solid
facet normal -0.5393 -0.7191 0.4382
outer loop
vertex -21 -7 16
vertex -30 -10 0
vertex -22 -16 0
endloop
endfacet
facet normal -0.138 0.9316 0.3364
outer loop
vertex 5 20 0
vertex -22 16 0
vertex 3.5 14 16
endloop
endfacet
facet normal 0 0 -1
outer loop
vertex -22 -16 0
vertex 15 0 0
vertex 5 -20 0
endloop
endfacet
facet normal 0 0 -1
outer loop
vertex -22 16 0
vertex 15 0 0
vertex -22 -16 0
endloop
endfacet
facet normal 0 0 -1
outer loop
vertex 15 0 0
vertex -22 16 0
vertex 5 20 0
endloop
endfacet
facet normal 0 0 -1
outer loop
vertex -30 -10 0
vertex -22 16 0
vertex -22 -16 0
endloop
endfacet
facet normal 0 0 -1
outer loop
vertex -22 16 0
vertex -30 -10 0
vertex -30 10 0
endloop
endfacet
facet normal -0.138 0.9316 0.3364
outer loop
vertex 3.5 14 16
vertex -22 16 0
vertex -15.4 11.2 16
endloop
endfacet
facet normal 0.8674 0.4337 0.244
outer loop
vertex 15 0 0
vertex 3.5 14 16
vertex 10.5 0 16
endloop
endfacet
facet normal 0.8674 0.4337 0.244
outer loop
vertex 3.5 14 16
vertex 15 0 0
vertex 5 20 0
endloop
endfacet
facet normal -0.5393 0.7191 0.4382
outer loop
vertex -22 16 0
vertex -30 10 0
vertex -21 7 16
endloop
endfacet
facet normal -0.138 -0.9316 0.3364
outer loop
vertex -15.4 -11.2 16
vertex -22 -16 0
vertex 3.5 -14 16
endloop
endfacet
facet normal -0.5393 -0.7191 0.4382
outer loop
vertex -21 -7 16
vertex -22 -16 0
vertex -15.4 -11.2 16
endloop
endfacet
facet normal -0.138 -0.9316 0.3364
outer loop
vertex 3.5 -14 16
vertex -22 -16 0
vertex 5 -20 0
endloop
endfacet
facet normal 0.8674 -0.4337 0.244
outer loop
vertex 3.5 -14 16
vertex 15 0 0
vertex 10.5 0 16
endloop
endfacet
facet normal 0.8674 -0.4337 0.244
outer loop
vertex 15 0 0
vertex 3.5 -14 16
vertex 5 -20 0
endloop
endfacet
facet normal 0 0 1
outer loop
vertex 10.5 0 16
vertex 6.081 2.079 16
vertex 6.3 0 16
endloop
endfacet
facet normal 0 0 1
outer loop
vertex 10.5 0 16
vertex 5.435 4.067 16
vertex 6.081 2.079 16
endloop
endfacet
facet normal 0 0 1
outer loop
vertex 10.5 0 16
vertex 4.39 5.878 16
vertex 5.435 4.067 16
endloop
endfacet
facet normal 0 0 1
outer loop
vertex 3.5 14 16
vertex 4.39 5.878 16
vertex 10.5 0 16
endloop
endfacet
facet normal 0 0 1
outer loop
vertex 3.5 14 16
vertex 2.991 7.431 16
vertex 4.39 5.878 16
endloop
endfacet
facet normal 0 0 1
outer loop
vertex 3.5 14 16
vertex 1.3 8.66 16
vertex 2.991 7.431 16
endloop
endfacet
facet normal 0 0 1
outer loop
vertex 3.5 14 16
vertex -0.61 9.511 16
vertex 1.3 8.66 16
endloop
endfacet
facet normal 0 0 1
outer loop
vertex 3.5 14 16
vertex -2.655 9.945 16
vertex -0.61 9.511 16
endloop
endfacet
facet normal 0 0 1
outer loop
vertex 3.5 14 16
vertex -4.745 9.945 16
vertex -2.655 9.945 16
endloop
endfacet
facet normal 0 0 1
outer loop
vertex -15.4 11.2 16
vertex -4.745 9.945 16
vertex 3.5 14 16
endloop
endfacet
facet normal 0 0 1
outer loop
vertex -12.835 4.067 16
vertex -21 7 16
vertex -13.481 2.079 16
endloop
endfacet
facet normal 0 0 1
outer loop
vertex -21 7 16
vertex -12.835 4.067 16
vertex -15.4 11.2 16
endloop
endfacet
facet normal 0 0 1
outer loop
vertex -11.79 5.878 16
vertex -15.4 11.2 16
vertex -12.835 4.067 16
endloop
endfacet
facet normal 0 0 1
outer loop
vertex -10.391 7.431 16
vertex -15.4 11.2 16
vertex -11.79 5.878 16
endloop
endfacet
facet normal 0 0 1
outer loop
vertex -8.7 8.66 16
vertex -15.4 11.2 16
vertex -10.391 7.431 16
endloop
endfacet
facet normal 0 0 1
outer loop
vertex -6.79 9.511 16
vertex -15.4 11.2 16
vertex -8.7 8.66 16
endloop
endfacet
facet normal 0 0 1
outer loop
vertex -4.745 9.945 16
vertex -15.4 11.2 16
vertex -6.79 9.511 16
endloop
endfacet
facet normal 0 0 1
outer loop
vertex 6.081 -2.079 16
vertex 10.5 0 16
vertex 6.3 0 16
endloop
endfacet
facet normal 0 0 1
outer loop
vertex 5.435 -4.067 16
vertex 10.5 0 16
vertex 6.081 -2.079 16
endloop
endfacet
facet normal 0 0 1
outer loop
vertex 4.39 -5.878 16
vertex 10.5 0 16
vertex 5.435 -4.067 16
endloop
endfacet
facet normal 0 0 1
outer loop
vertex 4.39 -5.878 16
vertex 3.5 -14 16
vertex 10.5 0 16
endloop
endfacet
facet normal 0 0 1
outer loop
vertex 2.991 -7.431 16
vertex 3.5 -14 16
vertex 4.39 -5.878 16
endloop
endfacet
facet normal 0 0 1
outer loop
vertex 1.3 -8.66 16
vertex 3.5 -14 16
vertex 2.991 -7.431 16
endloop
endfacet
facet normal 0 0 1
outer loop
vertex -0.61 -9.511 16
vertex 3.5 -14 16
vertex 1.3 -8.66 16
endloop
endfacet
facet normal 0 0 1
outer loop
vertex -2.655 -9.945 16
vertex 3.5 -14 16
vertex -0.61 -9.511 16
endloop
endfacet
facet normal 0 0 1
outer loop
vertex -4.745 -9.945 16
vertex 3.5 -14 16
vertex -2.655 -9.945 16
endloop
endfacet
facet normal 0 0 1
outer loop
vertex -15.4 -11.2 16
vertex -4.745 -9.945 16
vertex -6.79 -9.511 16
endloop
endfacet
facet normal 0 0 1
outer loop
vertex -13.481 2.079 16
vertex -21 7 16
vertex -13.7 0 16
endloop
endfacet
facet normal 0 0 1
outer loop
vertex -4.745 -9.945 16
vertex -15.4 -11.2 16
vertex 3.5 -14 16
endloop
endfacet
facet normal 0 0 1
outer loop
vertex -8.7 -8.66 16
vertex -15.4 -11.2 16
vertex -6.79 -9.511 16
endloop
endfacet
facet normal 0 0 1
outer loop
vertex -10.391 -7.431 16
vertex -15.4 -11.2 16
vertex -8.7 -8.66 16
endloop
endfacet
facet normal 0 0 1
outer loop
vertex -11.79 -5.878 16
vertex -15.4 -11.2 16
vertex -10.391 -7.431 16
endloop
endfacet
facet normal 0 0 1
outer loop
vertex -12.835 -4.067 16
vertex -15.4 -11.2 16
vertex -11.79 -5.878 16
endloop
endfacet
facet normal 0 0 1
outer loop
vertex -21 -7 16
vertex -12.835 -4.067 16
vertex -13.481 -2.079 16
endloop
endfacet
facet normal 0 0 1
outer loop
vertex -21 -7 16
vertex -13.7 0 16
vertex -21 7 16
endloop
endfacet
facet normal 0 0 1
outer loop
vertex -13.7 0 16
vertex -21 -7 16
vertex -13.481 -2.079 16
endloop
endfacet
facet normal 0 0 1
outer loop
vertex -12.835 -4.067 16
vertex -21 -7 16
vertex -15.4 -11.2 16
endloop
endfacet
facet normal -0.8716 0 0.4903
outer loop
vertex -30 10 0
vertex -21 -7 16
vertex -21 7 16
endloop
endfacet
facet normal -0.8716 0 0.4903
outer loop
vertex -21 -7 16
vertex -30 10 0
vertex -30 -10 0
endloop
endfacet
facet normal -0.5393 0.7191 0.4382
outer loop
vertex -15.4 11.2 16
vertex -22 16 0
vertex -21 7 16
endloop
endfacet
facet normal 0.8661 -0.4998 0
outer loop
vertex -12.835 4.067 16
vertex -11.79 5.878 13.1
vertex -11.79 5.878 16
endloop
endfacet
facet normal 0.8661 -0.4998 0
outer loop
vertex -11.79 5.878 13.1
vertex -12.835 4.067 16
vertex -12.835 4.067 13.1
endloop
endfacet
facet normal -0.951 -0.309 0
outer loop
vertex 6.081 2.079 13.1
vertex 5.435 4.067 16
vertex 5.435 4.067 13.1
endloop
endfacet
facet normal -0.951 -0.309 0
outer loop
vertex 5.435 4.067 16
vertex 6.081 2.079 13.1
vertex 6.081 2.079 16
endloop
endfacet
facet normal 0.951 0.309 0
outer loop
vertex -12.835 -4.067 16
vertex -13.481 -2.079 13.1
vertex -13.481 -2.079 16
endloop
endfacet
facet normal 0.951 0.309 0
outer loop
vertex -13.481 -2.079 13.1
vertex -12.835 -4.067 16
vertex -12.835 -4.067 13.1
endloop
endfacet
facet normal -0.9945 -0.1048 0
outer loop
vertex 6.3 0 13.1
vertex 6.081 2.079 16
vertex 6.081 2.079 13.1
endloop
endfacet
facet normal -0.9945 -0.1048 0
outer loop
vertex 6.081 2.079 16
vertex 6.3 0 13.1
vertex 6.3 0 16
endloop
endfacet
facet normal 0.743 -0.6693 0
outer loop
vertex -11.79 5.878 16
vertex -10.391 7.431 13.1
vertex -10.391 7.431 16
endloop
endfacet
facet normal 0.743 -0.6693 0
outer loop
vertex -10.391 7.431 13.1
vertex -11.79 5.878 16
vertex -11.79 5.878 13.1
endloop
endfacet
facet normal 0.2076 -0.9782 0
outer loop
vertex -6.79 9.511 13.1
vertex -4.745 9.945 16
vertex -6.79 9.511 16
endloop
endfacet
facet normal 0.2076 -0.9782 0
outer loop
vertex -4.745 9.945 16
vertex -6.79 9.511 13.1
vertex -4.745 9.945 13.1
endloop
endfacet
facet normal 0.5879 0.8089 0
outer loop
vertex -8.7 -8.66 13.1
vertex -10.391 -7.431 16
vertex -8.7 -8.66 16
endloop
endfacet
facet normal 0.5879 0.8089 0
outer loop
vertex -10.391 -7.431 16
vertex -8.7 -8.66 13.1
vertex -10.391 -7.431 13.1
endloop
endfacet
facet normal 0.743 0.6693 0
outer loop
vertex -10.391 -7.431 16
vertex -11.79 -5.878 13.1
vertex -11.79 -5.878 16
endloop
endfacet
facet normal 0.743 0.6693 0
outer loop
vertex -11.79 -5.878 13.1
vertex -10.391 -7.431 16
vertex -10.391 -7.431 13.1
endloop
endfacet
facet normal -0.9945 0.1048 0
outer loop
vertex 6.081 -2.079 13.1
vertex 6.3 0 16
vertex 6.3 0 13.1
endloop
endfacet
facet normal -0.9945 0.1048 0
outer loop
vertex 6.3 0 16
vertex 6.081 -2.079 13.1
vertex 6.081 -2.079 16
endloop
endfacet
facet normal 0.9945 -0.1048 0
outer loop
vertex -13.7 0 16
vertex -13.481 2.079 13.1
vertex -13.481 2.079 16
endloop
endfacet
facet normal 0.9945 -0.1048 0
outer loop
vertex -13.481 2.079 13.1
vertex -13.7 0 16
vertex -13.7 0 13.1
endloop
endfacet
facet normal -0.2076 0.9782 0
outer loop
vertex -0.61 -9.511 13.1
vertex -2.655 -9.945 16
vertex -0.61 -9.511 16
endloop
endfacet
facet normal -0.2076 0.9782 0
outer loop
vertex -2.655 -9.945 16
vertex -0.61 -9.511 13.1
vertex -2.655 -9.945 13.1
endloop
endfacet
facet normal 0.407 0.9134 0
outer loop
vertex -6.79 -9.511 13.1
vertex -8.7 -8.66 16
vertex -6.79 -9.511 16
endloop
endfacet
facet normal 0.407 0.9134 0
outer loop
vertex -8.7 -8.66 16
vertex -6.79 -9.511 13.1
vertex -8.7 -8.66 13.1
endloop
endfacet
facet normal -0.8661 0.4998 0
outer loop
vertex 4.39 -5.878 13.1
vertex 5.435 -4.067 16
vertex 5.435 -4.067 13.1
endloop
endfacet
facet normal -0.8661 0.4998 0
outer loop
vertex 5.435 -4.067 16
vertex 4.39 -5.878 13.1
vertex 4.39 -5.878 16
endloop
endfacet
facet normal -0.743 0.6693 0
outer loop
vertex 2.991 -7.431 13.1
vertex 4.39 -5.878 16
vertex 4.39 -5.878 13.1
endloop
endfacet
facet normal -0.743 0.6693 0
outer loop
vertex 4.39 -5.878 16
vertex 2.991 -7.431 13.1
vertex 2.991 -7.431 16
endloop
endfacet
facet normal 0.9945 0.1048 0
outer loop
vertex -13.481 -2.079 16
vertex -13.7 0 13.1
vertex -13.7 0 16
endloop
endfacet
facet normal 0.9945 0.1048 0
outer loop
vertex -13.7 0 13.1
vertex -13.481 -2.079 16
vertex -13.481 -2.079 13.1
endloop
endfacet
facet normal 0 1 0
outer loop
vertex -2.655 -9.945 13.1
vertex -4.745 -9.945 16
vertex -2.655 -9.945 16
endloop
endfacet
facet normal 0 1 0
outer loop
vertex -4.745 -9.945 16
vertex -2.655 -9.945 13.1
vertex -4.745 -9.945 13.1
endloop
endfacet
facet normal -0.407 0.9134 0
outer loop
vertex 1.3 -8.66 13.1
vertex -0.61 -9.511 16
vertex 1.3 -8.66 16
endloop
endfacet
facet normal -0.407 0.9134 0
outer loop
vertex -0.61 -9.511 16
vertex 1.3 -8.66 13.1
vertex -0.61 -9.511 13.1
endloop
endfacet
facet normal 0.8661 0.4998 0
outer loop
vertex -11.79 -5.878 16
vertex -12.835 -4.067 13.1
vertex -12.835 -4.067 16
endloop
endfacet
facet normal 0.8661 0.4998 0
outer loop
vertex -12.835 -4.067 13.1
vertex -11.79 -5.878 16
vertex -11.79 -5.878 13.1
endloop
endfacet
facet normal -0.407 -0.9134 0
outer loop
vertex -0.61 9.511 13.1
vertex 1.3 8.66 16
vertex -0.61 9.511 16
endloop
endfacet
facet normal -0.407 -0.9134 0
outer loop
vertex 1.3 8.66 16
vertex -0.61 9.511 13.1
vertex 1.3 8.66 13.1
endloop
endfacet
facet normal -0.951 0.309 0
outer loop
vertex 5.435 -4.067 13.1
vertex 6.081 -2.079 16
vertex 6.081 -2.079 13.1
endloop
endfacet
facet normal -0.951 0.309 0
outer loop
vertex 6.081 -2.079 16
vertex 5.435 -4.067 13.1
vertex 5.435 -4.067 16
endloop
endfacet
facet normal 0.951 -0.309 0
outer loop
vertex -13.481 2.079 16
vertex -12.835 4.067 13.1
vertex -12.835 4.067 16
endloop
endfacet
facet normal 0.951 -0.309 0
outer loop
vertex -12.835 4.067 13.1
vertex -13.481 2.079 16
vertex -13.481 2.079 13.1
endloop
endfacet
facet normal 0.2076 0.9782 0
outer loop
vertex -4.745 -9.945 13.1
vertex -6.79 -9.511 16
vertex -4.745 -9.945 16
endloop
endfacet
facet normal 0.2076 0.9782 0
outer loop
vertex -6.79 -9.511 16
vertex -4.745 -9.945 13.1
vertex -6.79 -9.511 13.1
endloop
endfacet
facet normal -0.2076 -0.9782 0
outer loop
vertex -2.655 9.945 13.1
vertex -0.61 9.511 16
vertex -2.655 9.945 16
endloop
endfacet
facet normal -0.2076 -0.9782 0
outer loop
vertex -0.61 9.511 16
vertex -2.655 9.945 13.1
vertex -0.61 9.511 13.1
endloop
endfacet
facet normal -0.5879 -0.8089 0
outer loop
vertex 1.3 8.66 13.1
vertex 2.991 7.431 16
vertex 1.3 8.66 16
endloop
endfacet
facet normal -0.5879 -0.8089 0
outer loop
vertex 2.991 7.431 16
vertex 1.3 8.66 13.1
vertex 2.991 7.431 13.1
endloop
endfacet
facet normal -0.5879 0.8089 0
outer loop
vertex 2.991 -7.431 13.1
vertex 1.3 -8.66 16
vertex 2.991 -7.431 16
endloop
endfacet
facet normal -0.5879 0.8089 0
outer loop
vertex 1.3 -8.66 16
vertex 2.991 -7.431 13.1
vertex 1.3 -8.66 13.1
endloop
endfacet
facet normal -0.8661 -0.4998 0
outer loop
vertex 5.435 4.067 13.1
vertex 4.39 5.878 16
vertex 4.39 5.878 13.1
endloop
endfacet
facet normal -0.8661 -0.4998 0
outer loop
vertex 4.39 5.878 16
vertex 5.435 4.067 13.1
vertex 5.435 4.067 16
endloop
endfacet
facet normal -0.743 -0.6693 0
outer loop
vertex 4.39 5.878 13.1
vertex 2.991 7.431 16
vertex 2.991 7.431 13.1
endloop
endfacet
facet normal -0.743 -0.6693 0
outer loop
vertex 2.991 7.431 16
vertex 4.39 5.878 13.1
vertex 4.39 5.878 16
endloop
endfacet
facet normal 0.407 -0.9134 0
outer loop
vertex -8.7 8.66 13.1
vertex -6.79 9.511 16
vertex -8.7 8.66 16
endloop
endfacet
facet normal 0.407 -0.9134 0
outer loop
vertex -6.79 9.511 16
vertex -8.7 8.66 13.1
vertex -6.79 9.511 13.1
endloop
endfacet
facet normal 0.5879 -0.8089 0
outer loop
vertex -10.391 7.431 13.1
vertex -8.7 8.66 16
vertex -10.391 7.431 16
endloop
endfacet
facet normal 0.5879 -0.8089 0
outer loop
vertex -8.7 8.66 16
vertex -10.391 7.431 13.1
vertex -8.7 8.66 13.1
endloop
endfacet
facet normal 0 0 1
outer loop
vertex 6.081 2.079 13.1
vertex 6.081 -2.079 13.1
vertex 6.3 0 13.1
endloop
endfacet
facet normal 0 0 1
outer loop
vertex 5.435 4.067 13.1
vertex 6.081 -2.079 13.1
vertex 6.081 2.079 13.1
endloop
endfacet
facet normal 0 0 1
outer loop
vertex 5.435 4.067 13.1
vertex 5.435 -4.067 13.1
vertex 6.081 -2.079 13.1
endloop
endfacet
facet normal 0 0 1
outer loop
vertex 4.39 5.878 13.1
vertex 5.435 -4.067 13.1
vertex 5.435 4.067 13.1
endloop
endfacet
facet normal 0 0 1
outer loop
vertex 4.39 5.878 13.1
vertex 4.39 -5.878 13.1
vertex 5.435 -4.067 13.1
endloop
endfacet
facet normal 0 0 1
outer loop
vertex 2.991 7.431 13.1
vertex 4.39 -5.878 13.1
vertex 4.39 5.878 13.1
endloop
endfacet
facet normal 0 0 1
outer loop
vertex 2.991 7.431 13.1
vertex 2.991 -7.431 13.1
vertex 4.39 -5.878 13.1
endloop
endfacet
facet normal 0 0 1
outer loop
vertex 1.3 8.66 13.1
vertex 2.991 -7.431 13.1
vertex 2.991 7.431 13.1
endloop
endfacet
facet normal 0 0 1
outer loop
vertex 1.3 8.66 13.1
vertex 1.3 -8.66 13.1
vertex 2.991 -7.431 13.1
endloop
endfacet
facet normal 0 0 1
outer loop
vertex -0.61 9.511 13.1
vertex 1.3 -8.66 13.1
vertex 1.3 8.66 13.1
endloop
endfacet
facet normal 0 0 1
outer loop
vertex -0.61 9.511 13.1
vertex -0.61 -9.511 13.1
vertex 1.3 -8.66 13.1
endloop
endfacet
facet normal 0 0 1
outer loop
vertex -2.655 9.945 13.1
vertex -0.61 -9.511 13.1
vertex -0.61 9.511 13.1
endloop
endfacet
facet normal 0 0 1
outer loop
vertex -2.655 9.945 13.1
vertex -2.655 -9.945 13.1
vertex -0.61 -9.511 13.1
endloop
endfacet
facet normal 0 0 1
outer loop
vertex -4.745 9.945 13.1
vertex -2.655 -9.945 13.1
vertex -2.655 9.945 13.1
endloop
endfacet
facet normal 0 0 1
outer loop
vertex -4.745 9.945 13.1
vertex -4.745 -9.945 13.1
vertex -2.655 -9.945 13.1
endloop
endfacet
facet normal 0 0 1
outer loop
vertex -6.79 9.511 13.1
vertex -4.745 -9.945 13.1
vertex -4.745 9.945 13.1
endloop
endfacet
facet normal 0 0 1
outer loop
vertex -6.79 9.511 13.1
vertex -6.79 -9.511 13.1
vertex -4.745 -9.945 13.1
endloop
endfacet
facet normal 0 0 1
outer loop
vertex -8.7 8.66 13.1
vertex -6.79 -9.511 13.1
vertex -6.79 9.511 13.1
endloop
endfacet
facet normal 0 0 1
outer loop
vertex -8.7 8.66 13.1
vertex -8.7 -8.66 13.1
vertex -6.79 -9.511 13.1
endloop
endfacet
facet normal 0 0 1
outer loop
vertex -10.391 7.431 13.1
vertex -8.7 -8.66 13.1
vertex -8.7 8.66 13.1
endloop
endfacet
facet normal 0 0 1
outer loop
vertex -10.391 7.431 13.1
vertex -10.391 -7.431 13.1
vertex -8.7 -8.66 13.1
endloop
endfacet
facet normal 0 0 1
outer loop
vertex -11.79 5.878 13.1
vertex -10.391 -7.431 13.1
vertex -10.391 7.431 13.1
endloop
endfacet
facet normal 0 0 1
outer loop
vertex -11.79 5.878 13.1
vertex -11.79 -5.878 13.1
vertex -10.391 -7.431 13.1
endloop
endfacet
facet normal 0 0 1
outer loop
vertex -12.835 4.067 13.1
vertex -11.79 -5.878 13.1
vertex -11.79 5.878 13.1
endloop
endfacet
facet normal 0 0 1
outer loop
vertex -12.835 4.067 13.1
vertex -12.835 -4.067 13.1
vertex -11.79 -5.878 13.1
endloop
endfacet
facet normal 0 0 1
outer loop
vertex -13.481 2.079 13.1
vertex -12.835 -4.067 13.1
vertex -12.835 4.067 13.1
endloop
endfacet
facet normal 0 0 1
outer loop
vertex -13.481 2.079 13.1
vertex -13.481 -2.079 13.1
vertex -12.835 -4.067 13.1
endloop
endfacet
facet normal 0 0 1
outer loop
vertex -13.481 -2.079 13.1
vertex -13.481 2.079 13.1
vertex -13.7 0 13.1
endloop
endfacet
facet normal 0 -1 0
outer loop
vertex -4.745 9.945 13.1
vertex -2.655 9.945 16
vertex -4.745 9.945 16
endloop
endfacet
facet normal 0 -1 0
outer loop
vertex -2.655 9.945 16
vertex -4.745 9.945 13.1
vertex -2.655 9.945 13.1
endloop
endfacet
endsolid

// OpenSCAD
module turret() {
linear_extrude(16,scale=0.7)
//scale([0.91,0.91,0])
translate([-5,0,0])
polygon([[-25,10],[-17,16],[10,20],[20,0],[10,-20],[-17,-16],[-25,-10]]);
}

module hatch() {
translate([-3.7,0,13.1])
linear_extrude(3)
circle(d=20);
}

difference() {
turret();
    hatch();
}
